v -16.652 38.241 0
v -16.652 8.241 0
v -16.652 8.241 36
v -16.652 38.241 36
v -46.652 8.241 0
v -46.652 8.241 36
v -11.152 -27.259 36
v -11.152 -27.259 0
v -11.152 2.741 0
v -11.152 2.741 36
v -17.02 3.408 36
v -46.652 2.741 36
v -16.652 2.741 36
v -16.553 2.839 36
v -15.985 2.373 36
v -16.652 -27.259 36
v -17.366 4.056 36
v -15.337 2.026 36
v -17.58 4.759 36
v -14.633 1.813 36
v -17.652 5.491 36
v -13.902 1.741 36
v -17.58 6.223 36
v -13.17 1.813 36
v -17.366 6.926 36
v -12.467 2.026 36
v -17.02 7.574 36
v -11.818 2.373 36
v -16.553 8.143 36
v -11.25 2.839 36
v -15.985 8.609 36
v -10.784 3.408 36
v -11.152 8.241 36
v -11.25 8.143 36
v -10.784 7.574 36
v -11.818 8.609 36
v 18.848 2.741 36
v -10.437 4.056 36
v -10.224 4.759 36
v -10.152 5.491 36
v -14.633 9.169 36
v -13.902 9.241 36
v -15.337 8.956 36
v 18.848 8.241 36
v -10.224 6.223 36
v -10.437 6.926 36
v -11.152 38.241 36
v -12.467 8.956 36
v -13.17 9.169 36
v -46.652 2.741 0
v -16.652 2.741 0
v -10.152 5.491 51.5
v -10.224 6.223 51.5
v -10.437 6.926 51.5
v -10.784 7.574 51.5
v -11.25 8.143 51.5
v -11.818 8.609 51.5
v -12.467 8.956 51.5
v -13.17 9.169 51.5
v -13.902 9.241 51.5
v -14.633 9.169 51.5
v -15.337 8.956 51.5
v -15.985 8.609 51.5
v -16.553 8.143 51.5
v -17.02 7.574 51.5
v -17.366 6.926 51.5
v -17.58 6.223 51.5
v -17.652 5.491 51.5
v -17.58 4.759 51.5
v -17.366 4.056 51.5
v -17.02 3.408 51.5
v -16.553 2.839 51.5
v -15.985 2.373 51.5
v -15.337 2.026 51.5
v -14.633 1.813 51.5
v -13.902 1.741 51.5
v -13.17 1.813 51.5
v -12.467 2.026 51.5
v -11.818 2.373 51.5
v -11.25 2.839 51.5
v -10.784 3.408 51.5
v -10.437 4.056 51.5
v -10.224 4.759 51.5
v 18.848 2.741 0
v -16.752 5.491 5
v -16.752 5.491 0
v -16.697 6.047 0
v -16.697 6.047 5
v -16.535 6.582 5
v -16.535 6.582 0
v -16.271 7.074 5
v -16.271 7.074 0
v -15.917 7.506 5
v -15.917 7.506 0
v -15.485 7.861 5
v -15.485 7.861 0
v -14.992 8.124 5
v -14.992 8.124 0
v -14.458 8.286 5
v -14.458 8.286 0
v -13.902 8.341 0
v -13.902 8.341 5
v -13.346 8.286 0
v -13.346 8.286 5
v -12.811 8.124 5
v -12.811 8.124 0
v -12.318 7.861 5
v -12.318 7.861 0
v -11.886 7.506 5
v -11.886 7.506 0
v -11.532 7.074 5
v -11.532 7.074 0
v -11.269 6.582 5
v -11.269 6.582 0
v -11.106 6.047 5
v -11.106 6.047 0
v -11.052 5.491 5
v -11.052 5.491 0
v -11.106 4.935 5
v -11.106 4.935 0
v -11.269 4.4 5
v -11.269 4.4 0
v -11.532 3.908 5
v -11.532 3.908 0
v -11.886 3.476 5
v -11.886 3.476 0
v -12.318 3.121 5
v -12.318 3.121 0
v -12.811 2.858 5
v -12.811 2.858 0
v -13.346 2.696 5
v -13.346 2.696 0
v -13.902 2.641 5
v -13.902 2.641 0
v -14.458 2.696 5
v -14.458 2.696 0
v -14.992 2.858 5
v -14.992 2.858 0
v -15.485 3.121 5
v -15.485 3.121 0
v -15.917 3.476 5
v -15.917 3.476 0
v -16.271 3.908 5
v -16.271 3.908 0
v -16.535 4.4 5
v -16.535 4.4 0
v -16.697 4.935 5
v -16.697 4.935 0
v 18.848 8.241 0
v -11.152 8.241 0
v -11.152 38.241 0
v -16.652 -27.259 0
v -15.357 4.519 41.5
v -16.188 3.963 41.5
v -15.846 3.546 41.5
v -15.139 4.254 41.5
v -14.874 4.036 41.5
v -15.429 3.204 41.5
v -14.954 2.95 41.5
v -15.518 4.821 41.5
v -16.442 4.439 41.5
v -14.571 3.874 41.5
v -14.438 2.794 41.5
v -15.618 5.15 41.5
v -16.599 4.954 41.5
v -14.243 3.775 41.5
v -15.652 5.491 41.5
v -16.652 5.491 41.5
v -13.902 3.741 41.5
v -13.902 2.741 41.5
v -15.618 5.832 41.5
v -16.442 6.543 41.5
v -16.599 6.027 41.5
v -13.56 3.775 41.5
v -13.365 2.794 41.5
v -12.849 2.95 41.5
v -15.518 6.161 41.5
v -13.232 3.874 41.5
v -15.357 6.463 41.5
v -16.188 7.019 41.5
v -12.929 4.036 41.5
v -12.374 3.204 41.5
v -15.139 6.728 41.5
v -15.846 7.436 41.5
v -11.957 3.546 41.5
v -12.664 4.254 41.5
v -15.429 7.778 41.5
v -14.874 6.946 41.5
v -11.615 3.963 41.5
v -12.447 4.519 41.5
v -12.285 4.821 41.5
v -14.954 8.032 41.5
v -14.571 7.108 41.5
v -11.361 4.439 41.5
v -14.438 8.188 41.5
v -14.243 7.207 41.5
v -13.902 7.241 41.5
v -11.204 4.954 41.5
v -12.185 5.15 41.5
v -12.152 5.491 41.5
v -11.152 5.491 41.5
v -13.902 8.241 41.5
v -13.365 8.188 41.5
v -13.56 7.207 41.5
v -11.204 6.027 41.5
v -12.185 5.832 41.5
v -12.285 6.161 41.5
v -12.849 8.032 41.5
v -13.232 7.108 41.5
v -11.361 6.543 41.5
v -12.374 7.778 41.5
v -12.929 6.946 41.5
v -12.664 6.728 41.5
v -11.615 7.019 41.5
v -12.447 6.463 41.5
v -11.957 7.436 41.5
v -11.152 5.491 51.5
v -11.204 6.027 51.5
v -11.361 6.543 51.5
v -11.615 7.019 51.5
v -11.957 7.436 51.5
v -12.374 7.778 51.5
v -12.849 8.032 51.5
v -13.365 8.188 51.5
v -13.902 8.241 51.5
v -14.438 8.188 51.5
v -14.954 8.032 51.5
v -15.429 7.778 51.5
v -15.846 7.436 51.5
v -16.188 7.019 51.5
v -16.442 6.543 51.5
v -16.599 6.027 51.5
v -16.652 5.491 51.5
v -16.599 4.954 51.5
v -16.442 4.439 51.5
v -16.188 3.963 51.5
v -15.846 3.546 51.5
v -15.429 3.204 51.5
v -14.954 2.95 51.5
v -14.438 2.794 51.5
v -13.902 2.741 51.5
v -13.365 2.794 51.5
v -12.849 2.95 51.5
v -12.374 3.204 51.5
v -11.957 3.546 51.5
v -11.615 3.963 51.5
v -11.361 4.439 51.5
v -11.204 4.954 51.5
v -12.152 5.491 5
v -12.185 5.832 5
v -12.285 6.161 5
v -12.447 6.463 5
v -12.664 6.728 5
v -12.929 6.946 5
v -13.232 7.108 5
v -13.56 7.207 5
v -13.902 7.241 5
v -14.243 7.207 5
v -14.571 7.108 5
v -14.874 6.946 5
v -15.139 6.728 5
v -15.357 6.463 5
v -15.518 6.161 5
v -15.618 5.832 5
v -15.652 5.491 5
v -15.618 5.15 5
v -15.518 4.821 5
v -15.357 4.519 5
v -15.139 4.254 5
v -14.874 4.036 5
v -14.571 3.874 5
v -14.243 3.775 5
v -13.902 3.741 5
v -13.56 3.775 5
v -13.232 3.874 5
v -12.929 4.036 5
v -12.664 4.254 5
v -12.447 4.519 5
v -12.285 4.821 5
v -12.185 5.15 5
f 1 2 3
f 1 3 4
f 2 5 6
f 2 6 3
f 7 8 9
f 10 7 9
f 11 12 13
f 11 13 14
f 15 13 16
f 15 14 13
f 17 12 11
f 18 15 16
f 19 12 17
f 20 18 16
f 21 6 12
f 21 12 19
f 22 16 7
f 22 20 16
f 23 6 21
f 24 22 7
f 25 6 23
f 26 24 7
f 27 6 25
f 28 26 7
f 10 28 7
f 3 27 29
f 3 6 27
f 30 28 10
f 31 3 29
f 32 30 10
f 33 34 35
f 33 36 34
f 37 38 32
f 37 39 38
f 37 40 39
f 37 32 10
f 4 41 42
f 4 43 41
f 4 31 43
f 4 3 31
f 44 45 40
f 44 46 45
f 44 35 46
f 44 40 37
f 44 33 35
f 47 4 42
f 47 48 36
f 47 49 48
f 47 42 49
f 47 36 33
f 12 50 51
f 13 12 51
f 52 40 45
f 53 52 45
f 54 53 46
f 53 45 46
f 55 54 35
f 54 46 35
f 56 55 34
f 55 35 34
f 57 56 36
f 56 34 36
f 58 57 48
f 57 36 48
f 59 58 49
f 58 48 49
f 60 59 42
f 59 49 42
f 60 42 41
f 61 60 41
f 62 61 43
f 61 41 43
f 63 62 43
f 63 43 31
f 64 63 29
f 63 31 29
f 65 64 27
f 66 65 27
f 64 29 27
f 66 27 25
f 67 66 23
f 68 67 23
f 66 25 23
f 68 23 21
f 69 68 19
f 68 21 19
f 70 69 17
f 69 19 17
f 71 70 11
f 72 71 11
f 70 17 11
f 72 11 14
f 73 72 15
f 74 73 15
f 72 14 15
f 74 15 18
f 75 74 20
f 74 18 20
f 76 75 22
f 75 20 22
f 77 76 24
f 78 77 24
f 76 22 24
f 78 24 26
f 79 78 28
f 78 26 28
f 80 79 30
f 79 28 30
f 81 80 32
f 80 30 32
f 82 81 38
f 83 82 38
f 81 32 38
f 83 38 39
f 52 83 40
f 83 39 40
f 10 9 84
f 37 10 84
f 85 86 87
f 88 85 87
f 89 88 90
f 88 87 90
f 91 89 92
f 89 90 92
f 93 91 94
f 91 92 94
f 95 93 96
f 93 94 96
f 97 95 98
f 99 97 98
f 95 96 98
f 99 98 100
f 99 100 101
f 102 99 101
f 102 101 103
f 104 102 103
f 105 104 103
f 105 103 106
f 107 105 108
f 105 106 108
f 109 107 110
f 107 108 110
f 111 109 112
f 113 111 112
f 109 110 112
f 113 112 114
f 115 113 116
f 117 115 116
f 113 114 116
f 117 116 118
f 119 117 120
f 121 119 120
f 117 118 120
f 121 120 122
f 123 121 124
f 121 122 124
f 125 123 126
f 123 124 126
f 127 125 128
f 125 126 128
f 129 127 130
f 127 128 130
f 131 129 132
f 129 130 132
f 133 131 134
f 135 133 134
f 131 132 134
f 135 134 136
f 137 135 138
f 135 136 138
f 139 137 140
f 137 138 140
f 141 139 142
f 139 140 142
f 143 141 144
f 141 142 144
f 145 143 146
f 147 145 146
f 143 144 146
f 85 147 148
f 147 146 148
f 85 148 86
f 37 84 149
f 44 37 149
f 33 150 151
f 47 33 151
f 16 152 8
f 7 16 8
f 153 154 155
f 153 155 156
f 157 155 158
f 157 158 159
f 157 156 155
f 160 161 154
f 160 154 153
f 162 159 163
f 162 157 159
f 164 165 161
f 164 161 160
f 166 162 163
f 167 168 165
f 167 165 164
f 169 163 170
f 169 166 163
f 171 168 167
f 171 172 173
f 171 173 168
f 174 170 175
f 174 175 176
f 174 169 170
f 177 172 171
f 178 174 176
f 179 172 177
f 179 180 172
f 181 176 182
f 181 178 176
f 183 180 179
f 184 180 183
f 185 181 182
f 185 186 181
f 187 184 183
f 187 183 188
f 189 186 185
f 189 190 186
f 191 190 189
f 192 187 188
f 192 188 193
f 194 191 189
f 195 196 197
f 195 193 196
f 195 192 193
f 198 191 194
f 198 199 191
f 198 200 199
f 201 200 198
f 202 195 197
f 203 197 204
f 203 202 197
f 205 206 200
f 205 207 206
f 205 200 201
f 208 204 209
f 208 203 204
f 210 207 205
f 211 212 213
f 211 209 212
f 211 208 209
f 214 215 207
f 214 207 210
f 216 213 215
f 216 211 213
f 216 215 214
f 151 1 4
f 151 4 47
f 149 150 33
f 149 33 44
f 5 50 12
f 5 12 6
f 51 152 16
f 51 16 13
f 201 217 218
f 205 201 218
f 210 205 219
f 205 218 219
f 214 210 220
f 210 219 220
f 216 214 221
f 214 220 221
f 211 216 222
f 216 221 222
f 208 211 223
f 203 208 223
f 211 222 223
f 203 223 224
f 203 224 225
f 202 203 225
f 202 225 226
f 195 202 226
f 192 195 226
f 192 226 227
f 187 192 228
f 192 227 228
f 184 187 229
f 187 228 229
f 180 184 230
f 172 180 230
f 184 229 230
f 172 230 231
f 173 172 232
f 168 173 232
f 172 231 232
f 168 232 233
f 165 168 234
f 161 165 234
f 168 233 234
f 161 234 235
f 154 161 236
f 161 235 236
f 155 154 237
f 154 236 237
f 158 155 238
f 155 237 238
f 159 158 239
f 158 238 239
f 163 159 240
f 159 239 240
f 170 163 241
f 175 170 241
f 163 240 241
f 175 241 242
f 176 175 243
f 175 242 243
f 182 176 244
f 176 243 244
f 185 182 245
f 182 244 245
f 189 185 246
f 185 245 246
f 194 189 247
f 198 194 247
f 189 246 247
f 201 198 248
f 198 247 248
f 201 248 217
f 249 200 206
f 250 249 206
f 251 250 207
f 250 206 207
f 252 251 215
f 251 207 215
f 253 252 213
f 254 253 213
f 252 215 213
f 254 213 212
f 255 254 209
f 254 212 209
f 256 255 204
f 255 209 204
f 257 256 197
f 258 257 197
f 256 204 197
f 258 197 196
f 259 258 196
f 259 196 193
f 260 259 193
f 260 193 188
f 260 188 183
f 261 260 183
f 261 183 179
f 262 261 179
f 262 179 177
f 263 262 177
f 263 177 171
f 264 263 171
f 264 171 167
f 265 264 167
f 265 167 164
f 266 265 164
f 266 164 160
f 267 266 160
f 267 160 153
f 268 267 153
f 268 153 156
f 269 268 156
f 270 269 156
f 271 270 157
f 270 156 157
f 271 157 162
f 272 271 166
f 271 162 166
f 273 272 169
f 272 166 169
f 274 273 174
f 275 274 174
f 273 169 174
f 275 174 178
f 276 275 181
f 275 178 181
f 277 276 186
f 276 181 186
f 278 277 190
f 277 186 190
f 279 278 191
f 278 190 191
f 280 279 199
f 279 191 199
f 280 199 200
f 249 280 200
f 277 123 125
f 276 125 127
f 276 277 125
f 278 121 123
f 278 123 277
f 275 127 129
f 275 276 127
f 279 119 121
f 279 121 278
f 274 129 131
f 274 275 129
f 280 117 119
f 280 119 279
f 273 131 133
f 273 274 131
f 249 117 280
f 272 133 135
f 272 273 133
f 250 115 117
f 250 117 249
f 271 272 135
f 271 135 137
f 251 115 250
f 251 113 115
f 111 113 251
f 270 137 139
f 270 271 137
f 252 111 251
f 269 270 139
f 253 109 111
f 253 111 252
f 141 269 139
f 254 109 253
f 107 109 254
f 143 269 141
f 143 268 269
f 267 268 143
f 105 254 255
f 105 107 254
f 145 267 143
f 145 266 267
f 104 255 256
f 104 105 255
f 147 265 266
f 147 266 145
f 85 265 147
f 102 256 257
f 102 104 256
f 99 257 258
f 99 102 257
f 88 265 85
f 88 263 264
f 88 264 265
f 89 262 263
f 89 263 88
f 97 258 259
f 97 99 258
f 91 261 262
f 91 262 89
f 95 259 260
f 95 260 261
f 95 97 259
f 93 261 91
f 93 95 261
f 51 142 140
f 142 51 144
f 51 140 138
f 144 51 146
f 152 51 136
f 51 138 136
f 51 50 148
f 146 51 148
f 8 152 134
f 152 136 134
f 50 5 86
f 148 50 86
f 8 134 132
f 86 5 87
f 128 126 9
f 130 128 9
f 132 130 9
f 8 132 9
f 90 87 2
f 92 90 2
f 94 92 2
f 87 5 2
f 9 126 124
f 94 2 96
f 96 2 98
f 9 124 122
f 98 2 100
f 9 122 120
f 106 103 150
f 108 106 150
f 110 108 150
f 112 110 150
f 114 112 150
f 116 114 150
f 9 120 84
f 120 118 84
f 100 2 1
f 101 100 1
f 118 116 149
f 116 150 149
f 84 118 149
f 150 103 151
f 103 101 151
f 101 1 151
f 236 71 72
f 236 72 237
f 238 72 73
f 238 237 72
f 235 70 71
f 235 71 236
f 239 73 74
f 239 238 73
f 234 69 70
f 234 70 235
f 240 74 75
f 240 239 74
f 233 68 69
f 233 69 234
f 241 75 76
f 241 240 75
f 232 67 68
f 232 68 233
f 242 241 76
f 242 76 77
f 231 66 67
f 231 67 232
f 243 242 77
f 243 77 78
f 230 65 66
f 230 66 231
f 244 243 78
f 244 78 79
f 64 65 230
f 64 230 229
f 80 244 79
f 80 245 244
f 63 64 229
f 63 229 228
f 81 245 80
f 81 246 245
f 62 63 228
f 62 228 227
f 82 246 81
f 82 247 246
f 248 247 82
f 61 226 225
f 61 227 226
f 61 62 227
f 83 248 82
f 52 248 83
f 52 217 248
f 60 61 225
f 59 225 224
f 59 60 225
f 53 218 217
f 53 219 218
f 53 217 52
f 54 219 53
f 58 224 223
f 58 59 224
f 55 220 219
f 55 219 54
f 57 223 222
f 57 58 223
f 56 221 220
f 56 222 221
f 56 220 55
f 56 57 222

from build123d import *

# Parameters (mm, degrees)
SKETCH_1_W          = 5.5
SKETCH_1_H          = 30
SKETCH_1_W_2        = 30
SKETCH_1_H_2        = 5.5
EXTRUDE_1_DEPTH     = 36
SKETCH_5_R          = 3.75
EXTRUDE_3_DEPTH     = 15.5
SKETCH_6_R          = 2.85
CUT_EXTRUDE_1_DEPTH = 5
SKETCH_7_R          = 1.75
CUT_EXTRUDE_2_DEPTH = 52.5
SKETCH_8_R          = 2.75
CUT_EXTRUDE_3_DEPTH = 10


with BuildPart() as part:
    # 草圖1 → 填料-伸長1 (new body)
    with BuildSketch(Plane.XY):
        with Locations((-13.901604276, 23.24099723)):
            Rectangle(SKETCH_1_W, SKETCH_1_H)
        with Locations((-31.651604276, 5.49099723)):
            Rectangle(SKETCH_1_W_2, SKETCH_1_H_2)
        with Locations((-13.901604276, -12.25900277)):
            Rectangle(SKETCH_1_W, SKETCH_1_H)
        with Locations((3.848395724, 5.49099723)):
            Rectangle(SKETCH_1_W_2, SKETCH_1_H_2)
        with Locations((-13.901604276, 5.49099723)):
            Rectangle(SKETCH_1_W, SKETCH_1_H_2)
    extrude(amount=EXTRUDE_1_DEPTH)

    # 草圖5 → 填料-伸長3 (add)
    with BuildSketch(Plane.XY.offset(36)):
        with Locations((-13.901604276, 5.49099723)):
            Circle(SKETCH_5_R)
    extrude(amount=EXTRUDE_3_DEPTH)

    # 草圖6 → 除料-伸長1 (cut)
    with BuildSketch(Plane(origin=(0, 0, 0), x_dir=(-1, 0, 0), z_dir=(0, 0, -1))):
        with Locations((13.901604276, 5.49099723)):
            Circle(SKETCH_6_R)
    extrude(amount=-CUT_EXTRUDE_1_DEPTH, mode=Mode.SUBTRACT)

    # 草圖7 → 除料-伸長2 (cut, through all)
    with BuildSketch(Plane.XY.offset(51.5)):
        with Locations((-13.901604276, 5.49099723)):
            Circle(SKETCH_7_R)
    extrude(amount=-CUT_EXTRUDE_2_DEPTH, mode=Mode.SUBTRACT)

    # 草圖8 → 除料-伸長3 (cut)
    with BuildSketch(Plane.XY.offset(51.5)):
        with Locations((-13.901604276, 5.49099723)):
            Circle(SKETCH_8_R)
    extrude(amount=-CUT_EXTRUDE_3_DEPTH, mode=Mode.SUBTRACT)


solid = part.part
